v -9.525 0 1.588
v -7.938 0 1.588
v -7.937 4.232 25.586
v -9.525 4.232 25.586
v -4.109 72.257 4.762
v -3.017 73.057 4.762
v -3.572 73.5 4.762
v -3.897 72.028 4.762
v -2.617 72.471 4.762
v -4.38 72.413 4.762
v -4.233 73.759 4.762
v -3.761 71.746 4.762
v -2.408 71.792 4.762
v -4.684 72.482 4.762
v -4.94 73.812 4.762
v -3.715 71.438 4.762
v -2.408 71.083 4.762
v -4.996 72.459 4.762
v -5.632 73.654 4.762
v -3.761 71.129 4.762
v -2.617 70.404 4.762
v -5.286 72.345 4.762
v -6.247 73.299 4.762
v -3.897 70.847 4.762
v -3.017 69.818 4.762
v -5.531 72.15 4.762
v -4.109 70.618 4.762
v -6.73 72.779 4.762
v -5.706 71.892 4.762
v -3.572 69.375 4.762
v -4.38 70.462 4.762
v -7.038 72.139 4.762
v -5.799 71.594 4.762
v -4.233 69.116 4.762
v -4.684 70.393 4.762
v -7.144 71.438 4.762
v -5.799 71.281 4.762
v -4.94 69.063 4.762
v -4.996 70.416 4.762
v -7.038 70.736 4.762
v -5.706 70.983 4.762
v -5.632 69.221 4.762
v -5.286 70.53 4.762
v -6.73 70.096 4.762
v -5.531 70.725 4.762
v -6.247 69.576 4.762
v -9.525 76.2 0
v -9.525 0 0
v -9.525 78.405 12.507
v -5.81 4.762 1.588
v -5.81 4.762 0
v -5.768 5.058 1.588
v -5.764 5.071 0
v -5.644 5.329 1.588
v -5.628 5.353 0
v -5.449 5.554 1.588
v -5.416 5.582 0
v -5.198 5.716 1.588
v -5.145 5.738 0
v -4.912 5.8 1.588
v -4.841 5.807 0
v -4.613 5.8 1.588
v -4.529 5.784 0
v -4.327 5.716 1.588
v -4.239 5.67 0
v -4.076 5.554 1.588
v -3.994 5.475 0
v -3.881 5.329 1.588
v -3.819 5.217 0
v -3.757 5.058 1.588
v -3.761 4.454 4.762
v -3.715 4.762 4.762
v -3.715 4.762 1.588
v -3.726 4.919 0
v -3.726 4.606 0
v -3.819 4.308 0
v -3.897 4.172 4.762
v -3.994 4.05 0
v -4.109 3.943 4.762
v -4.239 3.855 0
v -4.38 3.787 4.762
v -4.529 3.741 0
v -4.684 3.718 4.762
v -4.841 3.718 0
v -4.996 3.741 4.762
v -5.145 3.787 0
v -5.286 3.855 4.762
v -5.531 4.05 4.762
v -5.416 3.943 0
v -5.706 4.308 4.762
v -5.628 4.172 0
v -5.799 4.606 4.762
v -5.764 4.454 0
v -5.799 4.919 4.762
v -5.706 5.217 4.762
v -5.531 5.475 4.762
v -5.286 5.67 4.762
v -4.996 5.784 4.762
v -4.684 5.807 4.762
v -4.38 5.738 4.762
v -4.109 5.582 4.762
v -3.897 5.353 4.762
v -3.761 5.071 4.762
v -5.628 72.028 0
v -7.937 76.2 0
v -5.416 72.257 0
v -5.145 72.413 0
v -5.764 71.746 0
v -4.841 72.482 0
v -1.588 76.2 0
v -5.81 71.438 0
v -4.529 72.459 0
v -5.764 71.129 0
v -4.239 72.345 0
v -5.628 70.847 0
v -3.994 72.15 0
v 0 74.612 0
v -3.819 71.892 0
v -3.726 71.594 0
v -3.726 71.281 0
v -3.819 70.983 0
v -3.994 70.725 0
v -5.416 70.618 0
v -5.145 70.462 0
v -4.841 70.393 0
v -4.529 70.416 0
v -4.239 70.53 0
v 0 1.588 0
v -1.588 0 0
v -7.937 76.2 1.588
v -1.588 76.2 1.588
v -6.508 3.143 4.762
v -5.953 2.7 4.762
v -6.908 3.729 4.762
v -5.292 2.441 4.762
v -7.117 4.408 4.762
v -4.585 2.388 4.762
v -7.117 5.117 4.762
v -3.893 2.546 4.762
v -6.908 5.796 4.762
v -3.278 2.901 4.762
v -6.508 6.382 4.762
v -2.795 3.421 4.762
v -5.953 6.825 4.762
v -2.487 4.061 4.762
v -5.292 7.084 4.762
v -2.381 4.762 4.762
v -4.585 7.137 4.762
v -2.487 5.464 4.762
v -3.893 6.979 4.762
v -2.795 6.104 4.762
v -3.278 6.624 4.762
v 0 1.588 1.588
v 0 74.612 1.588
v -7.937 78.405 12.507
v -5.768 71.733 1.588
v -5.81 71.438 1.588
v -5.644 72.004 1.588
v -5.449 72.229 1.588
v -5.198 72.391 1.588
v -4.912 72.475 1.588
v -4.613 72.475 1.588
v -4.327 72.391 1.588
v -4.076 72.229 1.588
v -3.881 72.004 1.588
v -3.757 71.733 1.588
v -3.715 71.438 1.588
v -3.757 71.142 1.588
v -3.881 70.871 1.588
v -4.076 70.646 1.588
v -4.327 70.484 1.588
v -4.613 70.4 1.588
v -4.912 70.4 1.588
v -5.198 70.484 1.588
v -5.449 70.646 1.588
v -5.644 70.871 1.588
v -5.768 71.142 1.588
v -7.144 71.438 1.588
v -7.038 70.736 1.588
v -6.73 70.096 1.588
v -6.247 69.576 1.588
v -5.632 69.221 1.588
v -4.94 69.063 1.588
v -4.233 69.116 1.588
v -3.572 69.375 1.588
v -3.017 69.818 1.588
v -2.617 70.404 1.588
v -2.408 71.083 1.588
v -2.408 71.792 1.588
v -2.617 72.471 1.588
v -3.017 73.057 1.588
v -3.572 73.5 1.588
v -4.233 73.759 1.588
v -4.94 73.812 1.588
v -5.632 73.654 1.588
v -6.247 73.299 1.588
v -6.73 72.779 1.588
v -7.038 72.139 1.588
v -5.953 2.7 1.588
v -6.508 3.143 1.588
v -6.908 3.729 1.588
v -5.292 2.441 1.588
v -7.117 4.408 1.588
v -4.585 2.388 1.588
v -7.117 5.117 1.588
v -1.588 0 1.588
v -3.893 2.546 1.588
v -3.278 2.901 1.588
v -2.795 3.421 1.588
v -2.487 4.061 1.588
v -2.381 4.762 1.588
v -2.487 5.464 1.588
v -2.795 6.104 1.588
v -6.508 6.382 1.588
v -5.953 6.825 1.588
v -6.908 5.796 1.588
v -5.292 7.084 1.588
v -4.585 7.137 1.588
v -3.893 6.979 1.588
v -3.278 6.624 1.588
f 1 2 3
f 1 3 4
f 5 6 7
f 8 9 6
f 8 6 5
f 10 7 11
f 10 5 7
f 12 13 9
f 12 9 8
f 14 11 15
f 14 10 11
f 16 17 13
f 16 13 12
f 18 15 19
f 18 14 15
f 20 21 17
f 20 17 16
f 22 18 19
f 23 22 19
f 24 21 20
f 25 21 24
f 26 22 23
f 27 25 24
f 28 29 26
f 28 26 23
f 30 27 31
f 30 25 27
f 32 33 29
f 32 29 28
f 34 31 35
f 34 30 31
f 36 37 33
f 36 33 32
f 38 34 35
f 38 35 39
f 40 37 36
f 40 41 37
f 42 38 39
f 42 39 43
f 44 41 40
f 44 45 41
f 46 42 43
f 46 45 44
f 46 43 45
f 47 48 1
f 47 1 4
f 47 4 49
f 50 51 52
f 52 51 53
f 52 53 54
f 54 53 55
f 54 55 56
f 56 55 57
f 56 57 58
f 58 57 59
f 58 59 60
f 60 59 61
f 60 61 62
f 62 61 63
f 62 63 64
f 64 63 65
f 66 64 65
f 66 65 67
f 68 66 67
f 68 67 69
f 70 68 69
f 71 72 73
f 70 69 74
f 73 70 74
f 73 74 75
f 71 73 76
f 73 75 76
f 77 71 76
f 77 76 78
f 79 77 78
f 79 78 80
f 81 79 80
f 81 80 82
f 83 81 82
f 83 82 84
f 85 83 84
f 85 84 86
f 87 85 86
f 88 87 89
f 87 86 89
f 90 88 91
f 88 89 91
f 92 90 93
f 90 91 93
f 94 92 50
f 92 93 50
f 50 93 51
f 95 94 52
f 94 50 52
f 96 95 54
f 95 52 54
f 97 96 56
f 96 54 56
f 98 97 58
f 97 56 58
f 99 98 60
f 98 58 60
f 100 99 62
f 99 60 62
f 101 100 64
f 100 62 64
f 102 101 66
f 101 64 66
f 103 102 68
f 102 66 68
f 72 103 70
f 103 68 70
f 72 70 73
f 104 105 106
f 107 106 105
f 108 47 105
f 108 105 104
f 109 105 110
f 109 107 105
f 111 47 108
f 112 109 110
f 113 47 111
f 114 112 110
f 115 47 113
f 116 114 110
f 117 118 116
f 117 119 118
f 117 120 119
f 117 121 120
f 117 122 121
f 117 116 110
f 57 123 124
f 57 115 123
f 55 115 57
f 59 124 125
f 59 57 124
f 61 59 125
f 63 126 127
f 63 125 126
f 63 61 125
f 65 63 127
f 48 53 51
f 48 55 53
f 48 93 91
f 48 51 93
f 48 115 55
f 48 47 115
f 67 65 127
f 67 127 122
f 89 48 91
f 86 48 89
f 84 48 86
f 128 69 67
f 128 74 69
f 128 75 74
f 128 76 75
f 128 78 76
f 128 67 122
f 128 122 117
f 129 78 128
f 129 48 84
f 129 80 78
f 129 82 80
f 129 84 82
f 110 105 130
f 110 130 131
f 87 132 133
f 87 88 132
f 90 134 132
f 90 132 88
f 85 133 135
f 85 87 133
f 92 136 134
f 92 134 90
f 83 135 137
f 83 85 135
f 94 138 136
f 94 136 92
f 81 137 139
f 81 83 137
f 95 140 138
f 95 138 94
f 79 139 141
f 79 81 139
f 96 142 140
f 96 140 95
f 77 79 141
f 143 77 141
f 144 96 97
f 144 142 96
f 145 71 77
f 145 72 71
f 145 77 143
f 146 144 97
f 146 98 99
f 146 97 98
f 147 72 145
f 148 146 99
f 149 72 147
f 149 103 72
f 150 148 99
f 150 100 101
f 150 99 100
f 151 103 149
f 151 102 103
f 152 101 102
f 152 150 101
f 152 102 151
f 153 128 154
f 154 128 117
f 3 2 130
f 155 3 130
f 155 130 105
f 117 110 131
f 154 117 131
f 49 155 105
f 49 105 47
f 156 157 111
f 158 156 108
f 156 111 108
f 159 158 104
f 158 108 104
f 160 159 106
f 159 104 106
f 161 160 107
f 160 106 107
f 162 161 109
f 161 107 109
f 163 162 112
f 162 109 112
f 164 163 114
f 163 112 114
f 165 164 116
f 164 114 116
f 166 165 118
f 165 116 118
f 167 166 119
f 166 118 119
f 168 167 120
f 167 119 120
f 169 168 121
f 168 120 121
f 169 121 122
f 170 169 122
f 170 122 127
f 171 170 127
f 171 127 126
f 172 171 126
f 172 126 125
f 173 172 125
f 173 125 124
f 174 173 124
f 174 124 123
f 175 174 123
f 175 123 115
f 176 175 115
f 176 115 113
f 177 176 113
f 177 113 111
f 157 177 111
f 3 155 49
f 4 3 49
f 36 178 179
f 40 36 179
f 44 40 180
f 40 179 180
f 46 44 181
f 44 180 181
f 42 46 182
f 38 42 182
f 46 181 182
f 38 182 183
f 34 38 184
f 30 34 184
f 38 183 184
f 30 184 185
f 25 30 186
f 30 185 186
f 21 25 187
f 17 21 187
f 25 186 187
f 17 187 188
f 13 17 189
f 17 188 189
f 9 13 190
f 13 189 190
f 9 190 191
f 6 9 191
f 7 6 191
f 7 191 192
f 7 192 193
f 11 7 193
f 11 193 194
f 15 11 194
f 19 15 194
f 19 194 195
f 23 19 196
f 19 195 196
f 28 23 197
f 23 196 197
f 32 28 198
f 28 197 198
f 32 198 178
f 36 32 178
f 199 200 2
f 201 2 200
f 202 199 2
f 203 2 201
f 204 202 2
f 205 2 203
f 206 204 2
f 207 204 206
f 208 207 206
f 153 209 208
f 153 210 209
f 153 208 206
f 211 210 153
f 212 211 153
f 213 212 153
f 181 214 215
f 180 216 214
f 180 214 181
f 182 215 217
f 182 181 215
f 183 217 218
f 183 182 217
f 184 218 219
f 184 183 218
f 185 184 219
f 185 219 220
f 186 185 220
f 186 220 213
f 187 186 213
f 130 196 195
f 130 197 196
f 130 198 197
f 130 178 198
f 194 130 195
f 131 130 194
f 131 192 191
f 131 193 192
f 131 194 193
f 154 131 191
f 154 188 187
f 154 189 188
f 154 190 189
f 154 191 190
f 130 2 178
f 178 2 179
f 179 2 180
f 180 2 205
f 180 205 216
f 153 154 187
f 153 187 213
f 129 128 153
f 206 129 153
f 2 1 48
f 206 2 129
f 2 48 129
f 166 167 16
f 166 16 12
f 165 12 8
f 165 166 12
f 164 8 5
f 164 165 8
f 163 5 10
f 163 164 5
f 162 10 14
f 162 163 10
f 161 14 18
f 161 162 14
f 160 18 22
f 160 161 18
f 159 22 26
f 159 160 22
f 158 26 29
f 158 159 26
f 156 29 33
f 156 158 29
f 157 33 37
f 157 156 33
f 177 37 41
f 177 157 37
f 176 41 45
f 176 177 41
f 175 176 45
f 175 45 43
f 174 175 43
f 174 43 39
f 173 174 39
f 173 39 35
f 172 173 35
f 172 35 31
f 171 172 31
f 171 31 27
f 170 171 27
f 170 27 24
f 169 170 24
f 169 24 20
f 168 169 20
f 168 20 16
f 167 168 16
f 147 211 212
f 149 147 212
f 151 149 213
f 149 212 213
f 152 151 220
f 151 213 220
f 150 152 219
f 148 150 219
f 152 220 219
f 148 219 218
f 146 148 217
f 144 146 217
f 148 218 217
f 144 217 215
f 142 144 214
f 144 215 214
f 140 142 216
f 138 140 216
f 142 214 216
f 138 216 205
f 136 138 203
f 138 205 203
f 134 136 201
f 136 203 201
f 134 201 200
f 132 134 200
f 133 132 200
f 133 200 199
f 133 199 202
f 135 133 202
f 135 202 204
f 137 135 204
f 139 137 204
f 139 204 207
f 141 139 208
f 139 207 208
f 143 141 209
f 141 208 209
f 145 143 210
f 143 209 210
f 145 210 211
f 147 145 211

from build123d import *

# Parameters (mm, degrees)
SKETCH1_W                       = 9.525
SKETCH1_H                       = 76.2
BOSS_EXTRUDE1_DEPTH             = 1.5875
CHAMFER2_SIZE                   = 1.5875
F_97_0_0825_DIAMETER_HOLE1_D    = 2.0955
SKETCH5_R                       = 2.38125
SKETCH5_R_2                     = 1.04775
BOSS_EXTRUDE2_DEPTH             = 3.175
BOSS_EXTRUDE4_REACH             = 77.644
SKETCH7_W                       = 1.5875
SKETCH7_H                       = 75.318017262
BOSS_EXTRUDE4_DIRECTION_2_DEPTH = 12.7
CUT_EXTRUDE1_DEPTH              = 83.855524788


with BuildPart() as part:
    # Sketch1 → Boss-Extrude1 (new body)
    with BuildSketch(Plane.XY):
        with Locations((-4.7625, 38.1)):
            Rectangle(SKETCH1_W, SKETCH1_H)
    extrude(amount=BOSS_EXTRUDE1_DEPTH)

    # Chamfer2
    chamfer2_edges = [part.edges().sort_by_distance(p)[0] for p in [
        (0, 76.2, 0.79375),
        (-9.525, 76.2, 0.79375),
        (0, 0, 0.79375),
        (-9.525, 0, 0.79375),
    ]]
    chamfer(chamfer2_edges, length=CHAMFER2_SIZE)

    # #97 (0.0825) Diameter Hole1 (through all)
    with Locations(Plane.XY.offset(1.5875)):
        with Locations((-4.7625, 4.7625), (-4.7625, 71.4375)):
            Hole(F_97_0_0825_DIAMETER_HOLE1_D / 2)

    # Sketch5 → Boss-Extrude2 (add)
    # profile 1 of 2: a face of its own
    with BuildSketch(Plane.XY.offset(1.5875)):
        with Locations((-4.7625, 4.7625)):
            Circle(SKETCH5_R)
        with Locations((-4.7625, 4.7625)):
            Circle(SKETCH5_R_2, mode=Mode.SUBTRACT)
    # profile 2 of 2: a face of its own
    with BuildSketch(Plane.XY.offset(1.5875)):
        with Locations((-4.7625, 71.4375)):
            Circle(SKETCH5_R)
        with Locations((-4.7625, 71.4375)):
            Circle(SKETCH5_R_2, mode=Mode.SUBTRACT)
    extrude(amount=BOSS_EXTRUDE2_DEPTH)

    # Boss-Extrude4: up to this face of the body (flat: up to its plane)
    boss_extrude4_end = Plane(part.part.faces().sort_by_distance((-4.7625, 38.1, 0))[0])
    # Sketch7 → Boss-Extrude4 (add, up to the picked face)
    with BuildSketch(Plane(origin=(0, 2.297711148, 13.030967461), x_dir=(-1, 0, 0), z_dir=(0, -0.1736481776669307, -0.984807753012208)), mode=Mode.PRIVATE) as boss_extrude4_sk1:
        with Locations((8.73125, 37.383342149)):
            Rectangle(SKETCH7_W, SKETCH7_H)
    boss_extrude4_tool1 = split(extrude(boss_extrude4_sk1.sketch, amount=BOSS_EXTRUDE4_REACH, mode=Mode.PRIVATE), bisect_by=boss_extrude4_end, keep=Keep.BOTH, mode=Mode.PRIVATE)
    add(boss_extrude4_tool1.solids().sort_by(Axis((-8.73125, 39.113116, 6.539418), (0, -0.1736481776669307, -0.984807753012208)))[0])

    # Sketch7 → Boss-Extrude4 direction 2 (add)
    with BuildSketch(Plane(origin=(0, 2.297711148, 13.030967461), x_dir=(-1, 0, 0), z_dir=(0, -0.1736481776669307, -0.984807753012208))):
        with Locations((8.73125, 37.383342149)):
            Rectangle(SKETCH7_W, SKETCH7_H)
    extrude(amount=-BOSS_EXTRUDE4_DIRECTION_2_DEPTH)

    # Sketch9 → Cut-Extrude1 (cut, through all)
    with BuildSketch(Plane(origin=(-7.9375, 0, 0), x_dir=(0, 0, -1), z_dir=(1, 0, 0))):
        Polygon((0, 0), (-1.5875, 0), (0, -0.279919082), align=None)
    extrude(amount=-CUT_EXTRUDE1_DEPTH, mode=Mode.SUBTRACT)


solid = part.part
